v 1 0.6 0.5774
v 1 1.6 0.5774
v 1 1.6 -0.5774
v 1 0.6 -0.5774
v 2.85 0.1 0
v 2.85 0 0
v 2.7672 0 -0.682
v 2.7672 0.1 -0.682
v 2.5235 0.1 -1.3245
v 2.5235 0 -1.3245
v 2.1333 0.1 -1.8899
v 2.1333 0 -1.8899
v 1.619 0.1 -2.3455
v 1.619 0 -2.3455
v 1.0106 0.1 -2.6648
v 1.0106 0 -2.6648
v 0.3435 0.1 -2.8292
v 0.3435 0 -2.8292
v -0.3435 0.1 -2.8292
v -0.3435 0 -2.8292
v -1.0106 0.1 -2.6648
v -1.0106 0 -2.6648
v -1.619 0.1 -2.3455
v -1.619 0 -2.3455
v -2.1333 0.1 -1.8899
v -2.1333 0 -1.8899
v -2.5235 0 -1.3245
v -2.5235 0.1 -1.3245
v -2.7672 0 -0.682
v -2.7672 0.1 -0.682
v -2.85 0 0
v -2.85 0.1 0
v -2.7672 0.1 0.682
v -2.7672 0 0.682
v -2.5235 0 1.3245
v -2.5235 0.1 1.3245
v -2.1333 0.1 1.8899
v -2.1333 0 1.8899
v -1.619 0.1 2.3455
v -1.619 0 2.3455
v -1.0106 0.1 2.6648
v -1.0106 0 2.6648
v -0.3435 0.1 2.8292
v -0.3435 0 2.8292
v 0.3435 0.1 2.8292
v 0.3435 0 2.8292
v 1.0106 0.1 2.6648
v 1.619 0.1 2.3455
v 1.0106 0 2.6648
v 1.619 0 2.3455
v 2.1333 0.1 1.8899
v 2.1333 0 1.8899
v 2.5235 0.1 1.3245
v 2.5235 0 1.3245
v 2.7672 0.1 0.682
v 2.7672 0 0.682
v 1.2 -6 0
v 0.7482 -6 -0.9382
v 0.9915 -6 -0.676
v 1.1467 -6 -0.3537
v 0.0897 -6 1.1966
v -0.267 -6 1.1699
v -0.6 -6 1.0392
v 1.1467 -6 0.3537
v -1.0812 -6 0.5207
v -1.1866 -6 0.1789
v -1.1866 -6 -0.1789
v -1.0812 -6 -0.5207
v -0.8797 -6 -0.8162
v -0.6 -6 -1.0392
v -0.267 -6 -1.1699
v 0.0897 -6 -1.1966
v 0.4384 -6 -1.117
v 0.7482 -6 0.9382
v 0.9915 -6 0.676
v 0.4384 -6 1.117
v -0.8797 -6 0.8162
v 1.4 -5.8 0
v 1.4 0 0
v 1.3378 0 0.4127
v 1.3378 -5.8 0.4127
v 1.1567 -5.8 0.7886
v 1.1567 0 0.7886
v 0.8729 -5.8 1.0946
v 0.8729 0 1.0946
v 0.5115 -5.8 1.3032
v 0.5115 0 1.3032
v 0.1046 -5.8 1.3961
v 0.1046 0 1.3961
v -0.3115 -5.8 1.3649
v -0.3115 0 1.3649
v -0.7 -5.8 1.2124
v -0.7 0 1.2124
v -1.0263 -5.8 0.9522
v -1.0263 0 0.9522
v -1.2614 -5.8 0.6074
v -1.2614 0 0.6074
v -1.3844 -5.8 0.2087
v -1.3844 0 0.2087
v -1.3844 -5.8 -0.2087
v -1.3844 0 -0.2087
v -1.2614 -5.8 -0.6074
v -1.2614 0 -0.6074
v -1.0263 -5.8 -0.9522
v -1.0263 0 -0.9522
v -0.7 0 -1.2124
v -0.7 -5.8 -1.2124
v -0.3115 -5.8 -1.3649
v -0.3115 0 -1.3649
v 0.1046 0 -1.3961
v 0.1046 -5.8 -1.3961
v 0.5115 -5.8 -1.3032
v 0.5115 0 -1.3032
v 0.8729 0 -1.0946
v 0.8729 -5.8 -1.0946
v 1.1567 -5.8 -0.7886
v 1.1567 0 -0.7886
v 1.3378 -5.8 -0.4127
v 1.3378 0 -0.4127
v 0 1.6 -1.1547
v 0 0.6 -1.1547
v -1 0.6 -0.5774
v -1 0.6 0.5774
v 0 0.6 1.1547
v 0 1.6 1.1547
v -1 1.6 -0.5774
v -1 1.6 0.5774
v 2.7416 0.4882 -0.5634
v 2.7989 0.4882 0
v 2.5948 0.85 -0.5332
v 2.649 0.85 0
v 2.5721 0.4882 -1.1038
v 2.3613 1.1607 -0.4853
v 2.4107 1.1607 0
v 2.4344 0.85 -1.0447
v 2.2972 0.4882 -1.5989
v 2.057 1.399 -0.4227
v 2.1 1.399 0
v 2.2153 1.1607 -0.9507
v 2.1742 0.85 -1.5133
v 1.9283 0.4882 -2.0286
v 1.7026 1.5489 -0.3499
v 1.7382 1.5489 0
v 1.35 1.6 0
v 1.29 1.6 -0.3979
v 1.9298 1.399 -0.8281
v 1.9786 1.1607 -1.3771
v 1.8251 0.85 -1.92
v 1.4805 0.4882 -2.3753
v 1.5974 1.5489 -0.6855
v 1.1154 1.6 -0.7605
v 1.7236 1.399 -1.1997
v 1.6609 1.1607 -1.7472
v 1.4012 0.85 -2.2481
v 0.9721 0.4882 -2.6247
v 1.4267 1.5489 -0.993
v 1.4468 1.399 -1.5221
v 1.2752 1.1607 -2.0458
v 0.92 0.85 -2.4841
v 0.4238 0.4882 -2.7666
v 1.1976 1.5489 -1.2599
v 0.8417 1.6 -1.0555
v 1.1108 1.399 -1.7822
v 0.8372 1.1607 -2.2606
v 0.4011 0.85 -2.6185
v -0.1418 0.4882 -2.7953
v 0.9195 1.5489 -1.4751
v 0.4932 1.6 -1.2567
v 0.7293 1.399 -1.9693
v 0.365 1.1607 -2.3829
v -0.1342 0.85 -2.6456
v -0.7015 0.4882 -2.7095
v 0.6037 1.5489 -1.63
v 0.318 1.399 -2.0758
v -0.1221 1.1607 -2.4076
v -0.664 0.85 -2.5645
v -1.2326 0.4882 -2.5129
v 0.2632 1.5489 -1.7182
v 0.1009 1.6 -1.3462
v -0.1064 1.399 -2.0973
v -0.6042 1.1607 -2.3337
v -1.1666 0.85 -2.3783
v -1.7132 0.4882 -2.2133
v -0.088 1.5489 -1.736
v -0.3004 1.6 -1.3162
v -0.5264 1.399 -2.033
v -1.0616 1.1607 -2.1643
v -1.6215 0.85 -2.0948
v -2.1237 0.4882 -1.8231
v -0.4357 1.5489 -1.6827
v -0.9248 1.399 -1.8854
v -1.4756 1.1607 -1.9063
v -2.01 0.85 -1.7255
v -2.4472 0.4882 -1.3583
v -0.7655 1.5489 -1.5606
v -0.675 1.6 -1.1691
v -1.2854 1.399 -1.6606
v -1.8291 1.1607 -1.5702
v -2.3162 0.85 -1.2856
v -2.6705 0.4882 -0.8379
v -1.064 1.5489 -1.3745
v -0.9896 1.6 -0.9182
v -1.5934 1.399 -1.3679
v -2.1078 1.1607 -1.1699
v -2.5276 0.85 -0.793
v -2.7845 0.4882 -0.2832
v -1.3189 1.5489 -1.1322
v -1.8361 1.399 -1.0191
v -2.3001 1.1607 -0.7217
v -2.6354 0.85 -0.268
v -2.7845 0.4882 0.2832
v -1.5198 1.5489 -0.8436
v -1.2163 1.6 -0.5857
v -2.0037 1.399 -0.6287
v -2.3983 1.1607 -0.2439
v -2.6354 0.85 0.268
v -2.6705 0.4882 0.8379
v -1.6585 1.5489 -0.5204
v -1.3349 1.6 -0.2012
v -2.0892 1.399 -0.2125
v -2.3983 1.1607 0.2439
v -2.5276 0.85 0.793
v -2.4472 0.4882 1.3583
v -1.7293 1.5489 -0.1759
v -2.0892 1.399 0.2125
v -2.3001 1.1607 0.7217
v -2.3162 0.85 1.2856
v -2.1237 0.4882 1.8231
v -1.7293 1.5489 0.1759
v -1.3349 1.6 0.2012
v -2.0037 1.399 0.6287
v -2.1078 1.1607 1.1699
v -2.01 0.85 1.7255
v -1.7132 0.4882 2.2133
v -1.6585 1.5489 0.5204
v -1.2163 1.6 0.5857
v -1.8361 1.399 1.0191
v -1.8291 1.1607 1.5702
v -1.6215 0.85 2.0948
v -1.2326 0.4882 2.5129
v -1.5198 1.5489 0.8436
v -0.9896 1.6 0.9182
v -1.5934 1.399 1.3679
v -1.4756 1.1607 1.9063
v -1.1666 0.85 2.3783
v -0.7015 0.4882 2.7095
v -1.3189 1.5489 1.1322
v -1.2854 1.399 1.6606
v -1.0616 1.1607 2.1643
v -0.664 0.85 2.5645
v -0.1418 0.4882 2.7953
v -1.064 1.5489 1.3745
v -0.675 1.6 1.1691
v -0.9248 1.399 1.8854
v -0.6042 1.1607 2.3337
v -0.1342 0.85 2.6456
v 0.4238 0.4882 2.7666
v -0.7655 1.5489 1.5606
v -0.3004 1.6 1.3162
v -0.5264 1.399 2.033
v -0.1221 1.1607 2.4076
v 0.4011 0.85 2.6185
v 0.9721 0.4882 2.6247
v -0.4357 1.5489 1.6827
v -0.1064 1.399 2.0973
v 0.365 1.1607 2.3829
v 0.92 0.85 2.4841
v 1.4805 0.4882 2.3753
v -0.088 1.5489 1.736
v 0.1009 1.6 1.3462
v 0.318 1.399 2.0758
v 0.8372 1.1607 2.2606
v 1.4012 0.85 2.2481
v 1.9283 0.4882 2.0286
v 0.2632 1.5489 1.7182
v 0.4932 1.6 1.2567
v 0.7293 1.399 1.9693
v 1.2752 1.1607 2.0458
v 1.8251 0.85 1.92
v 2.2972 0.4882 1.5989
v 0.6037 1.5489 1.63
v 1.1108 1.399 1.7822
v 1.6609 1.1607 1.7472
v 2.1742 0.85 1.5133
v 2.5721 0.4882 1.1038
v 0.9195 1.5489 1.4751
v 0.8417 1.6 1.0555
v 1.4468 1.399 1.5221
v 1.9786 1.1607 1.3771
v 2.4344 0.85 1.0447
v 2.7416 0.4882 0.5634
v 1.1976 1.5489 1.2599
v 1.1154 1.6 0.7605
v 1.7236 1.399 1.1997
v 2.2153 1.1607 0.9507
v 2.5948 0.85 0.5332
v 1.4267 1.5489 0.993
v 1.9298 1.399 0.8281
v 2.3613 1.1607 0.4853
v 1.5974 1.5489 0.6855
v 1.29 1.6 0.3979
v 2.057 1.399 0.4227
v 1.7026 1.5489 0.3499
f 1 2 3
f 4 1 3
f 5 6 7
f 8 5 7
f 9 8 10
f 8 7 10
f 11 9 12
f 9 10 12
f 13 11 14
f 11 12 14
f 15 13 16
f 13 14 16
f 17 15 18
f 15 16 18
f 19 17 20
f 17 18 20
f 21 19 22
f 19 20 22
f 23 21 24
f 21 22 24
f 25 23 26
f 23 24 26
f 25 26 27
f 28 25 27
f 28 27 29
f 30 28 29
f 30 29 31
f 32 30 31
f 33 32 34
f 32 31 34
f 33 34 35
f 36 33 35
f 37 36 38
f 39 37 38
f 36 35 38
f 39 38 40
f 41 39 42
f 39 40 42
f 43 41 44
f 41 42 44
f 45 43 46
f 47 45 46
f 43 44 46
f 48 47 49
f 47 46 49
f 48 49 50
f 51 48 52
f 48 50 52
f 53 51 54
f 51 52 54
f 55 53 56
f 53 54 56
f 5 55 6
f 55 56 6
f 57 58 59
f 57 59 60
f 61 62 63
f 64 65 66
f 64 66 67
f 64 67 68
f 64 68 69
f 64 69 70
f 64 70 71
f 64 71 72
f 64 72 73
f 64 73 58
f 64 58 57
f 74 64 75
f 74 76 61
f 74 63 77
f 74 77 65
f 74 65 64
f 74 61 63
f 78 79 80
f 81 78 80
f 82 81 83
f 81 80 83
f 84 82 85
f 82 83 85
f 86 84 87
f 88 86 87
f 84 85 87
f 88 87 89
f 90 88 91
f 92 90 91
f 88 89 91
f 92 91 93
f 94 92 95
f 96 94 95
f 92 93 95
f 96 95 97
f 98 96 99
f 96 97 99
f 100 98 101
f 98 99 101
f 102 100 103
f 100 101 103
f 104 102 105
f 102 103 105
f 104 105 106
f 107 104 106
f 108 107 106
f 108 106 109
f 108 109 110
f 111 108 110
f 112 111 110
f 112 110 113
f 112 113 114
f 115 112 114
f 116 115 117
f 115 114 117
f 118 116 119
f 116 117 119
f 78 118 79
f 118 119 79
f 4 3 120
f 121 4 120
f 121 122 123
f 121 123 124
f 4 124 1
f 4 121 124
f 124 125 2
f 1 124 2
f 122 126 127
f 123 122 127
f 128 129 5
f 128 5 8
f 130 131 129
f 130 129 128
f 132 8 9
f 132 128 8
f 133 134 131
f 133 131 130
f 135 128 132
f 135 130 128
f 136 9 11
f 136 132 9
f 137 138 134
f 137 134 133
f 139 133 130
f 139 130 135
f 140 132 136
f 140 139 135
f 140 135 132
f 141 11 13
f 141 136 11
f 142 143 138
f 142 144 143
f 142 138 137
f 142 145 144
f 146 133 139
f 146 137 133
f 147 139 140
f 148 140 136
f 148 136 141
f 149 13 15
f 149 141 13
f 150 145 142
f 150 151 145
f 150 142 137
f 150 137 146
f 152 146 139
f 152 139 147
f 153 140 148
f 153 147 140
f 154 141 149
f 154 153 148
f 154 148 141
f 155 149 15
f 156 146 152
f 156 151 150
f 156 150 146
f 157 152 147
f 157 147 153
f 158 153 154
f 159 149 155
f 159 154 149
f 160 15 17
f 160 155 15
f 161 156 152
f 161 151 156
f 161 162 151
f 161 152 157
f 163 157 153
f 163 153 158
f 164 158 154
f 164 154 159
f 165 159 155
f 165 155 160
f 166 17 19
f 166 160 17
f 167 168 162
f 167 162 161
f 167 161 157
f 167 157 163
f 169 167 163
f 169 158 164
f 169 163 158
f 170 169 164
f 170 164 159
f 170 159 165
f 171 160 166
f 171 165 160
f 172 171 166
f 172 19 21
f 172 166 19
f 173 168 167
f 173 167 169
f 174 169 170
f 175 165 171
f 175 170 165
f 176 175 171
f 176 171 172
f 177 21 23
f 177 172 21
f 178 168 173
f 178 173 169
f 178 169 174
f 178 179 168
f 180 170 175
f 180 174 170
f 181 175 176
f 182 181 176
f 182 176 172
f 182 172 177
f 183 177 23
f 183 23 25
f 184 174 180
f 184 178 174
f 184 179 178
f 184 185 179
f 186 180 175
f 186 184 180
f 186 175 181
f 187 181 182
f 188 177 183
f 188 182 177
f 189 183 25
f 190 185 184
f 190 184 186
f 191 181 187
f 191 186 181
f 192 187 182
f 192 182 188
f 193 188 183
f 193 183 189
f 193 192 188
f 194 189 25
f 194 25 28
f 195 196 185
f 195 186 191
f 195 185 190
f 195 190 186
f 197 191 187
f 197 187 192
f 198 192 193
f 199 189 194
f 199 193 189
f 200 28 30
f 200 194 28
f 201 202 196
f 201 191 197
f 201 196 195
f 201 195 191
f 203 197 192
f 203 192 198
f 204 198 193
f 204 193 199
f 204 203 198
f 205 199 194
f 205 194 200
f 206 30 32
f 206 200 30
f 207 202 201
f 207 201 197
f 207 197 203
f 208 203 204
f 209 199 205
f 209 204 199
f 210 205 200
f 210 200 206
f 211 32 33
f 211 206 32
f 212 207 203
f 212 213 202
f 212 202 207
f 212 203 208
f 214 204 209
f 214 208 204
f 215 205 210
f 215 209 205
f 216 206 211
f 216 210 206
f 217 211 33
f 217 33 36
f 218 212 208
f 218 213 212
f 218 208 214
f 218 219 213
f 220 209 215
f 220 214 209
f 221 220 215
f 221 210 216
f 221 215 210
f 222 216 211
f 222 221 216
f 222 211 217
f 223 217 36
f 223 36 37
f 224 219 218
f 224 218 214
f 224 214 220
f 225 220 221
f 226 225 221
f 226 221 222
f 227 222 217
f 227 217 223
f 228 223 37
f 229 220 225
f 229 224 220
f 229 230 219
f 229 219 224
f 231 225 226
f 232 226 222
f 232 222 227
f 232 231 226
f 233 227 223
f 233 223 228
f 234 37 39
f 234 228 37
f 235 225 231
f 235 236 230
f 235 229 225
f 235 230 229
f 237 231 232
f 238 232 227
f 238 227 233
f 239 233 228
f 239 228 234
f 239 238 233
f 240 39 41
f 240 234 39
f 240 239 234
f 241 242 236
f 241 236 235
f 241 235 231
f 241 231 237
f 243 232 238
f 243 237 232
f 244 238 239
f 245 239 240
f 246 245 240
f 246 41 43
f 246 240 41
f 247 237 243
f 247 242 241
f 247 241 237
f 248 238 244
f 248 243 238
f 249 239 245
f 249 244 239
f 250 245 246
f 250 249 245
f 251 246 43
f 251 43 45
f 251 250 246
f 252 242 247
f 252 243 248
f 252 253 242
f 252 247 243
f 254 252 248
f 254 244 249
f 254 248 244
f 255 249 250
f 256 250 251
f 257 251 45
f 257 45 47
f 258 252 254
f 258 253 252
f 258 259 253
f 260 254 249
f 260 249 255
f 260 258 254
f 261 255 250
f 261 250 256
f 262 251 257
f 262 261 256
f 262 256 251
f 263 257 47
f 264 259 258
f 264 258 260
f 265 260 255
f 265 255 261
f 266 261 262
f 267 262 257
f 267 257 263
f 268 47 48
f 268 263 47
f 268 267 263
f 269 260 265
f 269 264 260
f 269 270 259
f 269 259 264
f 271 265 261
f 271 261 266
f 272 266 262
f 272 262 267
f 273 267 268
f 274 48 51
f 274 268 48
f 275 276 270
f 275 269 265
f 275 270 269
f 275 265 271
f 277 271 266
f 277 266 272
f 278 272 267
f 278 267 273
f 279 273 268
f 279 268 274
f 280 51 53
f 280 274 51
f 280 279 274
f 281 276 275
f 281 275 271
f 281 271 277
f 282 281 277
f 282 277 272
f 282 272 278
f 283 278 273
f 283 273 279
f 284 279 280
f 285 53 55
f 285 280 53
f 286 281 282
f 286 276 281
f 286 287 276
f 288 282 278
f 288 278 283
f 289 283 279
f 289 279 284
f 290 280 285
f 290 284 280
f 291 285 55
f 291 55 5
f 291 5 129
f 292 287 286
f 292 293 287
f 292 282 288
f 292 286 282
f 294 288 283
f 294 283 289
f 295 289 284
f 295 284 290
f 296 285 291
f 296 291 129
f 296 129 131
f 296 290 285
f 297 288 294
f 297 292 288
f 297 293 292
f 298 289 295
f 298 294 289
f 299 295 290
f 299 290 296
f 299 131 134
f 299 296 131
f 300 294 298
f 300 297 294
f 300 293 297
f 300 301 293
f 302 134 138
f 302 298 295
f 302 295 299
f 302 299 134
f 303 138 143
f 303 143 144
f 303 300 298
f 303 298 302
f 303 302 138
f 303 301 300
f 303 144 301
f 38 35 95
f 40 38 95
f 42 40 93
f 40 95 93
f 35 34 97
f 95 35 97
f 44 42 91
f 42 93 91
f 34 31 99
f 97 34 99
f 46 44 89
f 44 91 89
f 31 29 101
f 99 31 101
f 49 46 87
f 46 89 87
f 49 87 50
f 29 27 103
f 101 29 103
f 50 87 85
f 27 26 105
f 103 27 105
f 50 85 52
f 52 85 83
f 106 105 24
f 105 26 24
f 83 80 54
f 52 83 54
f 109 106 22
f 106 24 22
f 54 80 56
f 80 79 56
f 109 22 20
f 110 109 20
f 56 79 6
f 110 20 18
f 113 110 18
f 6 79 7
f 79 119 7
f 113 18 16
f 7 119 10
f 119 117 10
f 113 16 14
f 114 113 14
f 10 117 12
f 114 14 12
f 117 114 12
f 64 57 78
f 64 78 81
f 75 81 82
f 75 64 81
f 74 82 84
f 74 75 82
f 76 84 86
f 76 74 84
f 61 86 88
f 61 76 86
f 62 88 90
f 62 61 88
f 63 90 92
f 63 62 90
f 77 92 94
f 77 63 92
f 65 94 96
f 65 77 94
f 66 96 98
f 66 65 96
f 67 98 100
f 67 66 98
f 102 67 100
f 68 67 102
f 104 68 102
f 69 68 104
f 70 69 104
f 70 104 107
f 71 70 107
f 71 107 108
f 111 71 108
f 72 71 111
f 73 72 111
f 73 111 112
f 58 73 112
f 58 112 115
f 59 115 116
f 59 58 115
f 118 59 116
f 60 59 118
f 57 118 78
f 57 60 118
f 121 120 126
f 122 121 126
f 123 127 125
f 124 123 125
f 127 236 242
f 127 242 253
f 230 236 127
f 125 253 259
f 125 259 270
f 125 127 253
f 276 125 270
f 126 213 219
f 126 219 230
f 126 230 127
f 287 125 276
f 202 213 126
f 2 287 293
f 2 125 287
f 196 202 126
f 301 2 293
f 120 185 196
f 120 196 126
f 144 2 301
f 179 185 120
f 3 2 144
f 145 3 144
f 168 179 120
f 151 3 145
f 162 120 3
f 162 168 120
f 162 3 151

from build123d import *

# Parameters (mm, degrees)
SKETCH_1_R          = 2.85
EXTRUDE_1_DEPTH     = 1.6
CUT_EXTRUDE_1_DEPTH = 1
FILLET_1_R          = 1.5
SKETCH_3_R          = 1.4
EXTRUDE_2_DEPTH     = 6
CHAMFER_1_SIZE      = 0.2


with BuildPart() as part:
    # 草图1 → 凸台-拉伸1 (new body)
    with BuildSketch(Plane(origin=(0, 0, 0), x_dir=(1, 0, 0), z_dir=(0, 1, 0))):
        Circle(SKETCH_1_R)
    extrude(amount=EXTRUDE_1_DEPTH)

    # 草图2 → 切除-拉伸1 (cut)
    with BuildSketch(Plane(origin=(0, 1.6, 0), x_dir=(1, 0, 0), z_dir=(0, 1, 0))):
        Polygon((0, -1.154700538), (1, -0.577350269), (1, 0.577350269), (0, 1.154700538), (-1, 0.577350269), (-1, -0.577350269), align=None)
    extrude(amount=-CUT_EXTRUDE_1_DEPTH, mode=Mode.SUBTRACT)

    # 圆角1
    fillet_1_edges = [part.edges().sort_by_distance(p)[0] for p in [
        (-2.85, 1.6, 0),
    ]]
    fillet(fillet_1_edges, radius=FILLET_1_R)

    # 草图3 → 凸台-拉伸2 (add)
    with BuildSketch(Plane.XZ):
        Circle(SKETCH_3_R)
    extrude(amount=EXTRUDE_2_DEPTH)

    # 倒角1
    chamfer_1_edges = [part.edges().sort_by_distance(p)[0] for p in [
        (-1.4, -6, 0),
    ]]
    chamfer(chamfer_1_edges, length=CHAMFER_1_SIZE)


solid = part.part
